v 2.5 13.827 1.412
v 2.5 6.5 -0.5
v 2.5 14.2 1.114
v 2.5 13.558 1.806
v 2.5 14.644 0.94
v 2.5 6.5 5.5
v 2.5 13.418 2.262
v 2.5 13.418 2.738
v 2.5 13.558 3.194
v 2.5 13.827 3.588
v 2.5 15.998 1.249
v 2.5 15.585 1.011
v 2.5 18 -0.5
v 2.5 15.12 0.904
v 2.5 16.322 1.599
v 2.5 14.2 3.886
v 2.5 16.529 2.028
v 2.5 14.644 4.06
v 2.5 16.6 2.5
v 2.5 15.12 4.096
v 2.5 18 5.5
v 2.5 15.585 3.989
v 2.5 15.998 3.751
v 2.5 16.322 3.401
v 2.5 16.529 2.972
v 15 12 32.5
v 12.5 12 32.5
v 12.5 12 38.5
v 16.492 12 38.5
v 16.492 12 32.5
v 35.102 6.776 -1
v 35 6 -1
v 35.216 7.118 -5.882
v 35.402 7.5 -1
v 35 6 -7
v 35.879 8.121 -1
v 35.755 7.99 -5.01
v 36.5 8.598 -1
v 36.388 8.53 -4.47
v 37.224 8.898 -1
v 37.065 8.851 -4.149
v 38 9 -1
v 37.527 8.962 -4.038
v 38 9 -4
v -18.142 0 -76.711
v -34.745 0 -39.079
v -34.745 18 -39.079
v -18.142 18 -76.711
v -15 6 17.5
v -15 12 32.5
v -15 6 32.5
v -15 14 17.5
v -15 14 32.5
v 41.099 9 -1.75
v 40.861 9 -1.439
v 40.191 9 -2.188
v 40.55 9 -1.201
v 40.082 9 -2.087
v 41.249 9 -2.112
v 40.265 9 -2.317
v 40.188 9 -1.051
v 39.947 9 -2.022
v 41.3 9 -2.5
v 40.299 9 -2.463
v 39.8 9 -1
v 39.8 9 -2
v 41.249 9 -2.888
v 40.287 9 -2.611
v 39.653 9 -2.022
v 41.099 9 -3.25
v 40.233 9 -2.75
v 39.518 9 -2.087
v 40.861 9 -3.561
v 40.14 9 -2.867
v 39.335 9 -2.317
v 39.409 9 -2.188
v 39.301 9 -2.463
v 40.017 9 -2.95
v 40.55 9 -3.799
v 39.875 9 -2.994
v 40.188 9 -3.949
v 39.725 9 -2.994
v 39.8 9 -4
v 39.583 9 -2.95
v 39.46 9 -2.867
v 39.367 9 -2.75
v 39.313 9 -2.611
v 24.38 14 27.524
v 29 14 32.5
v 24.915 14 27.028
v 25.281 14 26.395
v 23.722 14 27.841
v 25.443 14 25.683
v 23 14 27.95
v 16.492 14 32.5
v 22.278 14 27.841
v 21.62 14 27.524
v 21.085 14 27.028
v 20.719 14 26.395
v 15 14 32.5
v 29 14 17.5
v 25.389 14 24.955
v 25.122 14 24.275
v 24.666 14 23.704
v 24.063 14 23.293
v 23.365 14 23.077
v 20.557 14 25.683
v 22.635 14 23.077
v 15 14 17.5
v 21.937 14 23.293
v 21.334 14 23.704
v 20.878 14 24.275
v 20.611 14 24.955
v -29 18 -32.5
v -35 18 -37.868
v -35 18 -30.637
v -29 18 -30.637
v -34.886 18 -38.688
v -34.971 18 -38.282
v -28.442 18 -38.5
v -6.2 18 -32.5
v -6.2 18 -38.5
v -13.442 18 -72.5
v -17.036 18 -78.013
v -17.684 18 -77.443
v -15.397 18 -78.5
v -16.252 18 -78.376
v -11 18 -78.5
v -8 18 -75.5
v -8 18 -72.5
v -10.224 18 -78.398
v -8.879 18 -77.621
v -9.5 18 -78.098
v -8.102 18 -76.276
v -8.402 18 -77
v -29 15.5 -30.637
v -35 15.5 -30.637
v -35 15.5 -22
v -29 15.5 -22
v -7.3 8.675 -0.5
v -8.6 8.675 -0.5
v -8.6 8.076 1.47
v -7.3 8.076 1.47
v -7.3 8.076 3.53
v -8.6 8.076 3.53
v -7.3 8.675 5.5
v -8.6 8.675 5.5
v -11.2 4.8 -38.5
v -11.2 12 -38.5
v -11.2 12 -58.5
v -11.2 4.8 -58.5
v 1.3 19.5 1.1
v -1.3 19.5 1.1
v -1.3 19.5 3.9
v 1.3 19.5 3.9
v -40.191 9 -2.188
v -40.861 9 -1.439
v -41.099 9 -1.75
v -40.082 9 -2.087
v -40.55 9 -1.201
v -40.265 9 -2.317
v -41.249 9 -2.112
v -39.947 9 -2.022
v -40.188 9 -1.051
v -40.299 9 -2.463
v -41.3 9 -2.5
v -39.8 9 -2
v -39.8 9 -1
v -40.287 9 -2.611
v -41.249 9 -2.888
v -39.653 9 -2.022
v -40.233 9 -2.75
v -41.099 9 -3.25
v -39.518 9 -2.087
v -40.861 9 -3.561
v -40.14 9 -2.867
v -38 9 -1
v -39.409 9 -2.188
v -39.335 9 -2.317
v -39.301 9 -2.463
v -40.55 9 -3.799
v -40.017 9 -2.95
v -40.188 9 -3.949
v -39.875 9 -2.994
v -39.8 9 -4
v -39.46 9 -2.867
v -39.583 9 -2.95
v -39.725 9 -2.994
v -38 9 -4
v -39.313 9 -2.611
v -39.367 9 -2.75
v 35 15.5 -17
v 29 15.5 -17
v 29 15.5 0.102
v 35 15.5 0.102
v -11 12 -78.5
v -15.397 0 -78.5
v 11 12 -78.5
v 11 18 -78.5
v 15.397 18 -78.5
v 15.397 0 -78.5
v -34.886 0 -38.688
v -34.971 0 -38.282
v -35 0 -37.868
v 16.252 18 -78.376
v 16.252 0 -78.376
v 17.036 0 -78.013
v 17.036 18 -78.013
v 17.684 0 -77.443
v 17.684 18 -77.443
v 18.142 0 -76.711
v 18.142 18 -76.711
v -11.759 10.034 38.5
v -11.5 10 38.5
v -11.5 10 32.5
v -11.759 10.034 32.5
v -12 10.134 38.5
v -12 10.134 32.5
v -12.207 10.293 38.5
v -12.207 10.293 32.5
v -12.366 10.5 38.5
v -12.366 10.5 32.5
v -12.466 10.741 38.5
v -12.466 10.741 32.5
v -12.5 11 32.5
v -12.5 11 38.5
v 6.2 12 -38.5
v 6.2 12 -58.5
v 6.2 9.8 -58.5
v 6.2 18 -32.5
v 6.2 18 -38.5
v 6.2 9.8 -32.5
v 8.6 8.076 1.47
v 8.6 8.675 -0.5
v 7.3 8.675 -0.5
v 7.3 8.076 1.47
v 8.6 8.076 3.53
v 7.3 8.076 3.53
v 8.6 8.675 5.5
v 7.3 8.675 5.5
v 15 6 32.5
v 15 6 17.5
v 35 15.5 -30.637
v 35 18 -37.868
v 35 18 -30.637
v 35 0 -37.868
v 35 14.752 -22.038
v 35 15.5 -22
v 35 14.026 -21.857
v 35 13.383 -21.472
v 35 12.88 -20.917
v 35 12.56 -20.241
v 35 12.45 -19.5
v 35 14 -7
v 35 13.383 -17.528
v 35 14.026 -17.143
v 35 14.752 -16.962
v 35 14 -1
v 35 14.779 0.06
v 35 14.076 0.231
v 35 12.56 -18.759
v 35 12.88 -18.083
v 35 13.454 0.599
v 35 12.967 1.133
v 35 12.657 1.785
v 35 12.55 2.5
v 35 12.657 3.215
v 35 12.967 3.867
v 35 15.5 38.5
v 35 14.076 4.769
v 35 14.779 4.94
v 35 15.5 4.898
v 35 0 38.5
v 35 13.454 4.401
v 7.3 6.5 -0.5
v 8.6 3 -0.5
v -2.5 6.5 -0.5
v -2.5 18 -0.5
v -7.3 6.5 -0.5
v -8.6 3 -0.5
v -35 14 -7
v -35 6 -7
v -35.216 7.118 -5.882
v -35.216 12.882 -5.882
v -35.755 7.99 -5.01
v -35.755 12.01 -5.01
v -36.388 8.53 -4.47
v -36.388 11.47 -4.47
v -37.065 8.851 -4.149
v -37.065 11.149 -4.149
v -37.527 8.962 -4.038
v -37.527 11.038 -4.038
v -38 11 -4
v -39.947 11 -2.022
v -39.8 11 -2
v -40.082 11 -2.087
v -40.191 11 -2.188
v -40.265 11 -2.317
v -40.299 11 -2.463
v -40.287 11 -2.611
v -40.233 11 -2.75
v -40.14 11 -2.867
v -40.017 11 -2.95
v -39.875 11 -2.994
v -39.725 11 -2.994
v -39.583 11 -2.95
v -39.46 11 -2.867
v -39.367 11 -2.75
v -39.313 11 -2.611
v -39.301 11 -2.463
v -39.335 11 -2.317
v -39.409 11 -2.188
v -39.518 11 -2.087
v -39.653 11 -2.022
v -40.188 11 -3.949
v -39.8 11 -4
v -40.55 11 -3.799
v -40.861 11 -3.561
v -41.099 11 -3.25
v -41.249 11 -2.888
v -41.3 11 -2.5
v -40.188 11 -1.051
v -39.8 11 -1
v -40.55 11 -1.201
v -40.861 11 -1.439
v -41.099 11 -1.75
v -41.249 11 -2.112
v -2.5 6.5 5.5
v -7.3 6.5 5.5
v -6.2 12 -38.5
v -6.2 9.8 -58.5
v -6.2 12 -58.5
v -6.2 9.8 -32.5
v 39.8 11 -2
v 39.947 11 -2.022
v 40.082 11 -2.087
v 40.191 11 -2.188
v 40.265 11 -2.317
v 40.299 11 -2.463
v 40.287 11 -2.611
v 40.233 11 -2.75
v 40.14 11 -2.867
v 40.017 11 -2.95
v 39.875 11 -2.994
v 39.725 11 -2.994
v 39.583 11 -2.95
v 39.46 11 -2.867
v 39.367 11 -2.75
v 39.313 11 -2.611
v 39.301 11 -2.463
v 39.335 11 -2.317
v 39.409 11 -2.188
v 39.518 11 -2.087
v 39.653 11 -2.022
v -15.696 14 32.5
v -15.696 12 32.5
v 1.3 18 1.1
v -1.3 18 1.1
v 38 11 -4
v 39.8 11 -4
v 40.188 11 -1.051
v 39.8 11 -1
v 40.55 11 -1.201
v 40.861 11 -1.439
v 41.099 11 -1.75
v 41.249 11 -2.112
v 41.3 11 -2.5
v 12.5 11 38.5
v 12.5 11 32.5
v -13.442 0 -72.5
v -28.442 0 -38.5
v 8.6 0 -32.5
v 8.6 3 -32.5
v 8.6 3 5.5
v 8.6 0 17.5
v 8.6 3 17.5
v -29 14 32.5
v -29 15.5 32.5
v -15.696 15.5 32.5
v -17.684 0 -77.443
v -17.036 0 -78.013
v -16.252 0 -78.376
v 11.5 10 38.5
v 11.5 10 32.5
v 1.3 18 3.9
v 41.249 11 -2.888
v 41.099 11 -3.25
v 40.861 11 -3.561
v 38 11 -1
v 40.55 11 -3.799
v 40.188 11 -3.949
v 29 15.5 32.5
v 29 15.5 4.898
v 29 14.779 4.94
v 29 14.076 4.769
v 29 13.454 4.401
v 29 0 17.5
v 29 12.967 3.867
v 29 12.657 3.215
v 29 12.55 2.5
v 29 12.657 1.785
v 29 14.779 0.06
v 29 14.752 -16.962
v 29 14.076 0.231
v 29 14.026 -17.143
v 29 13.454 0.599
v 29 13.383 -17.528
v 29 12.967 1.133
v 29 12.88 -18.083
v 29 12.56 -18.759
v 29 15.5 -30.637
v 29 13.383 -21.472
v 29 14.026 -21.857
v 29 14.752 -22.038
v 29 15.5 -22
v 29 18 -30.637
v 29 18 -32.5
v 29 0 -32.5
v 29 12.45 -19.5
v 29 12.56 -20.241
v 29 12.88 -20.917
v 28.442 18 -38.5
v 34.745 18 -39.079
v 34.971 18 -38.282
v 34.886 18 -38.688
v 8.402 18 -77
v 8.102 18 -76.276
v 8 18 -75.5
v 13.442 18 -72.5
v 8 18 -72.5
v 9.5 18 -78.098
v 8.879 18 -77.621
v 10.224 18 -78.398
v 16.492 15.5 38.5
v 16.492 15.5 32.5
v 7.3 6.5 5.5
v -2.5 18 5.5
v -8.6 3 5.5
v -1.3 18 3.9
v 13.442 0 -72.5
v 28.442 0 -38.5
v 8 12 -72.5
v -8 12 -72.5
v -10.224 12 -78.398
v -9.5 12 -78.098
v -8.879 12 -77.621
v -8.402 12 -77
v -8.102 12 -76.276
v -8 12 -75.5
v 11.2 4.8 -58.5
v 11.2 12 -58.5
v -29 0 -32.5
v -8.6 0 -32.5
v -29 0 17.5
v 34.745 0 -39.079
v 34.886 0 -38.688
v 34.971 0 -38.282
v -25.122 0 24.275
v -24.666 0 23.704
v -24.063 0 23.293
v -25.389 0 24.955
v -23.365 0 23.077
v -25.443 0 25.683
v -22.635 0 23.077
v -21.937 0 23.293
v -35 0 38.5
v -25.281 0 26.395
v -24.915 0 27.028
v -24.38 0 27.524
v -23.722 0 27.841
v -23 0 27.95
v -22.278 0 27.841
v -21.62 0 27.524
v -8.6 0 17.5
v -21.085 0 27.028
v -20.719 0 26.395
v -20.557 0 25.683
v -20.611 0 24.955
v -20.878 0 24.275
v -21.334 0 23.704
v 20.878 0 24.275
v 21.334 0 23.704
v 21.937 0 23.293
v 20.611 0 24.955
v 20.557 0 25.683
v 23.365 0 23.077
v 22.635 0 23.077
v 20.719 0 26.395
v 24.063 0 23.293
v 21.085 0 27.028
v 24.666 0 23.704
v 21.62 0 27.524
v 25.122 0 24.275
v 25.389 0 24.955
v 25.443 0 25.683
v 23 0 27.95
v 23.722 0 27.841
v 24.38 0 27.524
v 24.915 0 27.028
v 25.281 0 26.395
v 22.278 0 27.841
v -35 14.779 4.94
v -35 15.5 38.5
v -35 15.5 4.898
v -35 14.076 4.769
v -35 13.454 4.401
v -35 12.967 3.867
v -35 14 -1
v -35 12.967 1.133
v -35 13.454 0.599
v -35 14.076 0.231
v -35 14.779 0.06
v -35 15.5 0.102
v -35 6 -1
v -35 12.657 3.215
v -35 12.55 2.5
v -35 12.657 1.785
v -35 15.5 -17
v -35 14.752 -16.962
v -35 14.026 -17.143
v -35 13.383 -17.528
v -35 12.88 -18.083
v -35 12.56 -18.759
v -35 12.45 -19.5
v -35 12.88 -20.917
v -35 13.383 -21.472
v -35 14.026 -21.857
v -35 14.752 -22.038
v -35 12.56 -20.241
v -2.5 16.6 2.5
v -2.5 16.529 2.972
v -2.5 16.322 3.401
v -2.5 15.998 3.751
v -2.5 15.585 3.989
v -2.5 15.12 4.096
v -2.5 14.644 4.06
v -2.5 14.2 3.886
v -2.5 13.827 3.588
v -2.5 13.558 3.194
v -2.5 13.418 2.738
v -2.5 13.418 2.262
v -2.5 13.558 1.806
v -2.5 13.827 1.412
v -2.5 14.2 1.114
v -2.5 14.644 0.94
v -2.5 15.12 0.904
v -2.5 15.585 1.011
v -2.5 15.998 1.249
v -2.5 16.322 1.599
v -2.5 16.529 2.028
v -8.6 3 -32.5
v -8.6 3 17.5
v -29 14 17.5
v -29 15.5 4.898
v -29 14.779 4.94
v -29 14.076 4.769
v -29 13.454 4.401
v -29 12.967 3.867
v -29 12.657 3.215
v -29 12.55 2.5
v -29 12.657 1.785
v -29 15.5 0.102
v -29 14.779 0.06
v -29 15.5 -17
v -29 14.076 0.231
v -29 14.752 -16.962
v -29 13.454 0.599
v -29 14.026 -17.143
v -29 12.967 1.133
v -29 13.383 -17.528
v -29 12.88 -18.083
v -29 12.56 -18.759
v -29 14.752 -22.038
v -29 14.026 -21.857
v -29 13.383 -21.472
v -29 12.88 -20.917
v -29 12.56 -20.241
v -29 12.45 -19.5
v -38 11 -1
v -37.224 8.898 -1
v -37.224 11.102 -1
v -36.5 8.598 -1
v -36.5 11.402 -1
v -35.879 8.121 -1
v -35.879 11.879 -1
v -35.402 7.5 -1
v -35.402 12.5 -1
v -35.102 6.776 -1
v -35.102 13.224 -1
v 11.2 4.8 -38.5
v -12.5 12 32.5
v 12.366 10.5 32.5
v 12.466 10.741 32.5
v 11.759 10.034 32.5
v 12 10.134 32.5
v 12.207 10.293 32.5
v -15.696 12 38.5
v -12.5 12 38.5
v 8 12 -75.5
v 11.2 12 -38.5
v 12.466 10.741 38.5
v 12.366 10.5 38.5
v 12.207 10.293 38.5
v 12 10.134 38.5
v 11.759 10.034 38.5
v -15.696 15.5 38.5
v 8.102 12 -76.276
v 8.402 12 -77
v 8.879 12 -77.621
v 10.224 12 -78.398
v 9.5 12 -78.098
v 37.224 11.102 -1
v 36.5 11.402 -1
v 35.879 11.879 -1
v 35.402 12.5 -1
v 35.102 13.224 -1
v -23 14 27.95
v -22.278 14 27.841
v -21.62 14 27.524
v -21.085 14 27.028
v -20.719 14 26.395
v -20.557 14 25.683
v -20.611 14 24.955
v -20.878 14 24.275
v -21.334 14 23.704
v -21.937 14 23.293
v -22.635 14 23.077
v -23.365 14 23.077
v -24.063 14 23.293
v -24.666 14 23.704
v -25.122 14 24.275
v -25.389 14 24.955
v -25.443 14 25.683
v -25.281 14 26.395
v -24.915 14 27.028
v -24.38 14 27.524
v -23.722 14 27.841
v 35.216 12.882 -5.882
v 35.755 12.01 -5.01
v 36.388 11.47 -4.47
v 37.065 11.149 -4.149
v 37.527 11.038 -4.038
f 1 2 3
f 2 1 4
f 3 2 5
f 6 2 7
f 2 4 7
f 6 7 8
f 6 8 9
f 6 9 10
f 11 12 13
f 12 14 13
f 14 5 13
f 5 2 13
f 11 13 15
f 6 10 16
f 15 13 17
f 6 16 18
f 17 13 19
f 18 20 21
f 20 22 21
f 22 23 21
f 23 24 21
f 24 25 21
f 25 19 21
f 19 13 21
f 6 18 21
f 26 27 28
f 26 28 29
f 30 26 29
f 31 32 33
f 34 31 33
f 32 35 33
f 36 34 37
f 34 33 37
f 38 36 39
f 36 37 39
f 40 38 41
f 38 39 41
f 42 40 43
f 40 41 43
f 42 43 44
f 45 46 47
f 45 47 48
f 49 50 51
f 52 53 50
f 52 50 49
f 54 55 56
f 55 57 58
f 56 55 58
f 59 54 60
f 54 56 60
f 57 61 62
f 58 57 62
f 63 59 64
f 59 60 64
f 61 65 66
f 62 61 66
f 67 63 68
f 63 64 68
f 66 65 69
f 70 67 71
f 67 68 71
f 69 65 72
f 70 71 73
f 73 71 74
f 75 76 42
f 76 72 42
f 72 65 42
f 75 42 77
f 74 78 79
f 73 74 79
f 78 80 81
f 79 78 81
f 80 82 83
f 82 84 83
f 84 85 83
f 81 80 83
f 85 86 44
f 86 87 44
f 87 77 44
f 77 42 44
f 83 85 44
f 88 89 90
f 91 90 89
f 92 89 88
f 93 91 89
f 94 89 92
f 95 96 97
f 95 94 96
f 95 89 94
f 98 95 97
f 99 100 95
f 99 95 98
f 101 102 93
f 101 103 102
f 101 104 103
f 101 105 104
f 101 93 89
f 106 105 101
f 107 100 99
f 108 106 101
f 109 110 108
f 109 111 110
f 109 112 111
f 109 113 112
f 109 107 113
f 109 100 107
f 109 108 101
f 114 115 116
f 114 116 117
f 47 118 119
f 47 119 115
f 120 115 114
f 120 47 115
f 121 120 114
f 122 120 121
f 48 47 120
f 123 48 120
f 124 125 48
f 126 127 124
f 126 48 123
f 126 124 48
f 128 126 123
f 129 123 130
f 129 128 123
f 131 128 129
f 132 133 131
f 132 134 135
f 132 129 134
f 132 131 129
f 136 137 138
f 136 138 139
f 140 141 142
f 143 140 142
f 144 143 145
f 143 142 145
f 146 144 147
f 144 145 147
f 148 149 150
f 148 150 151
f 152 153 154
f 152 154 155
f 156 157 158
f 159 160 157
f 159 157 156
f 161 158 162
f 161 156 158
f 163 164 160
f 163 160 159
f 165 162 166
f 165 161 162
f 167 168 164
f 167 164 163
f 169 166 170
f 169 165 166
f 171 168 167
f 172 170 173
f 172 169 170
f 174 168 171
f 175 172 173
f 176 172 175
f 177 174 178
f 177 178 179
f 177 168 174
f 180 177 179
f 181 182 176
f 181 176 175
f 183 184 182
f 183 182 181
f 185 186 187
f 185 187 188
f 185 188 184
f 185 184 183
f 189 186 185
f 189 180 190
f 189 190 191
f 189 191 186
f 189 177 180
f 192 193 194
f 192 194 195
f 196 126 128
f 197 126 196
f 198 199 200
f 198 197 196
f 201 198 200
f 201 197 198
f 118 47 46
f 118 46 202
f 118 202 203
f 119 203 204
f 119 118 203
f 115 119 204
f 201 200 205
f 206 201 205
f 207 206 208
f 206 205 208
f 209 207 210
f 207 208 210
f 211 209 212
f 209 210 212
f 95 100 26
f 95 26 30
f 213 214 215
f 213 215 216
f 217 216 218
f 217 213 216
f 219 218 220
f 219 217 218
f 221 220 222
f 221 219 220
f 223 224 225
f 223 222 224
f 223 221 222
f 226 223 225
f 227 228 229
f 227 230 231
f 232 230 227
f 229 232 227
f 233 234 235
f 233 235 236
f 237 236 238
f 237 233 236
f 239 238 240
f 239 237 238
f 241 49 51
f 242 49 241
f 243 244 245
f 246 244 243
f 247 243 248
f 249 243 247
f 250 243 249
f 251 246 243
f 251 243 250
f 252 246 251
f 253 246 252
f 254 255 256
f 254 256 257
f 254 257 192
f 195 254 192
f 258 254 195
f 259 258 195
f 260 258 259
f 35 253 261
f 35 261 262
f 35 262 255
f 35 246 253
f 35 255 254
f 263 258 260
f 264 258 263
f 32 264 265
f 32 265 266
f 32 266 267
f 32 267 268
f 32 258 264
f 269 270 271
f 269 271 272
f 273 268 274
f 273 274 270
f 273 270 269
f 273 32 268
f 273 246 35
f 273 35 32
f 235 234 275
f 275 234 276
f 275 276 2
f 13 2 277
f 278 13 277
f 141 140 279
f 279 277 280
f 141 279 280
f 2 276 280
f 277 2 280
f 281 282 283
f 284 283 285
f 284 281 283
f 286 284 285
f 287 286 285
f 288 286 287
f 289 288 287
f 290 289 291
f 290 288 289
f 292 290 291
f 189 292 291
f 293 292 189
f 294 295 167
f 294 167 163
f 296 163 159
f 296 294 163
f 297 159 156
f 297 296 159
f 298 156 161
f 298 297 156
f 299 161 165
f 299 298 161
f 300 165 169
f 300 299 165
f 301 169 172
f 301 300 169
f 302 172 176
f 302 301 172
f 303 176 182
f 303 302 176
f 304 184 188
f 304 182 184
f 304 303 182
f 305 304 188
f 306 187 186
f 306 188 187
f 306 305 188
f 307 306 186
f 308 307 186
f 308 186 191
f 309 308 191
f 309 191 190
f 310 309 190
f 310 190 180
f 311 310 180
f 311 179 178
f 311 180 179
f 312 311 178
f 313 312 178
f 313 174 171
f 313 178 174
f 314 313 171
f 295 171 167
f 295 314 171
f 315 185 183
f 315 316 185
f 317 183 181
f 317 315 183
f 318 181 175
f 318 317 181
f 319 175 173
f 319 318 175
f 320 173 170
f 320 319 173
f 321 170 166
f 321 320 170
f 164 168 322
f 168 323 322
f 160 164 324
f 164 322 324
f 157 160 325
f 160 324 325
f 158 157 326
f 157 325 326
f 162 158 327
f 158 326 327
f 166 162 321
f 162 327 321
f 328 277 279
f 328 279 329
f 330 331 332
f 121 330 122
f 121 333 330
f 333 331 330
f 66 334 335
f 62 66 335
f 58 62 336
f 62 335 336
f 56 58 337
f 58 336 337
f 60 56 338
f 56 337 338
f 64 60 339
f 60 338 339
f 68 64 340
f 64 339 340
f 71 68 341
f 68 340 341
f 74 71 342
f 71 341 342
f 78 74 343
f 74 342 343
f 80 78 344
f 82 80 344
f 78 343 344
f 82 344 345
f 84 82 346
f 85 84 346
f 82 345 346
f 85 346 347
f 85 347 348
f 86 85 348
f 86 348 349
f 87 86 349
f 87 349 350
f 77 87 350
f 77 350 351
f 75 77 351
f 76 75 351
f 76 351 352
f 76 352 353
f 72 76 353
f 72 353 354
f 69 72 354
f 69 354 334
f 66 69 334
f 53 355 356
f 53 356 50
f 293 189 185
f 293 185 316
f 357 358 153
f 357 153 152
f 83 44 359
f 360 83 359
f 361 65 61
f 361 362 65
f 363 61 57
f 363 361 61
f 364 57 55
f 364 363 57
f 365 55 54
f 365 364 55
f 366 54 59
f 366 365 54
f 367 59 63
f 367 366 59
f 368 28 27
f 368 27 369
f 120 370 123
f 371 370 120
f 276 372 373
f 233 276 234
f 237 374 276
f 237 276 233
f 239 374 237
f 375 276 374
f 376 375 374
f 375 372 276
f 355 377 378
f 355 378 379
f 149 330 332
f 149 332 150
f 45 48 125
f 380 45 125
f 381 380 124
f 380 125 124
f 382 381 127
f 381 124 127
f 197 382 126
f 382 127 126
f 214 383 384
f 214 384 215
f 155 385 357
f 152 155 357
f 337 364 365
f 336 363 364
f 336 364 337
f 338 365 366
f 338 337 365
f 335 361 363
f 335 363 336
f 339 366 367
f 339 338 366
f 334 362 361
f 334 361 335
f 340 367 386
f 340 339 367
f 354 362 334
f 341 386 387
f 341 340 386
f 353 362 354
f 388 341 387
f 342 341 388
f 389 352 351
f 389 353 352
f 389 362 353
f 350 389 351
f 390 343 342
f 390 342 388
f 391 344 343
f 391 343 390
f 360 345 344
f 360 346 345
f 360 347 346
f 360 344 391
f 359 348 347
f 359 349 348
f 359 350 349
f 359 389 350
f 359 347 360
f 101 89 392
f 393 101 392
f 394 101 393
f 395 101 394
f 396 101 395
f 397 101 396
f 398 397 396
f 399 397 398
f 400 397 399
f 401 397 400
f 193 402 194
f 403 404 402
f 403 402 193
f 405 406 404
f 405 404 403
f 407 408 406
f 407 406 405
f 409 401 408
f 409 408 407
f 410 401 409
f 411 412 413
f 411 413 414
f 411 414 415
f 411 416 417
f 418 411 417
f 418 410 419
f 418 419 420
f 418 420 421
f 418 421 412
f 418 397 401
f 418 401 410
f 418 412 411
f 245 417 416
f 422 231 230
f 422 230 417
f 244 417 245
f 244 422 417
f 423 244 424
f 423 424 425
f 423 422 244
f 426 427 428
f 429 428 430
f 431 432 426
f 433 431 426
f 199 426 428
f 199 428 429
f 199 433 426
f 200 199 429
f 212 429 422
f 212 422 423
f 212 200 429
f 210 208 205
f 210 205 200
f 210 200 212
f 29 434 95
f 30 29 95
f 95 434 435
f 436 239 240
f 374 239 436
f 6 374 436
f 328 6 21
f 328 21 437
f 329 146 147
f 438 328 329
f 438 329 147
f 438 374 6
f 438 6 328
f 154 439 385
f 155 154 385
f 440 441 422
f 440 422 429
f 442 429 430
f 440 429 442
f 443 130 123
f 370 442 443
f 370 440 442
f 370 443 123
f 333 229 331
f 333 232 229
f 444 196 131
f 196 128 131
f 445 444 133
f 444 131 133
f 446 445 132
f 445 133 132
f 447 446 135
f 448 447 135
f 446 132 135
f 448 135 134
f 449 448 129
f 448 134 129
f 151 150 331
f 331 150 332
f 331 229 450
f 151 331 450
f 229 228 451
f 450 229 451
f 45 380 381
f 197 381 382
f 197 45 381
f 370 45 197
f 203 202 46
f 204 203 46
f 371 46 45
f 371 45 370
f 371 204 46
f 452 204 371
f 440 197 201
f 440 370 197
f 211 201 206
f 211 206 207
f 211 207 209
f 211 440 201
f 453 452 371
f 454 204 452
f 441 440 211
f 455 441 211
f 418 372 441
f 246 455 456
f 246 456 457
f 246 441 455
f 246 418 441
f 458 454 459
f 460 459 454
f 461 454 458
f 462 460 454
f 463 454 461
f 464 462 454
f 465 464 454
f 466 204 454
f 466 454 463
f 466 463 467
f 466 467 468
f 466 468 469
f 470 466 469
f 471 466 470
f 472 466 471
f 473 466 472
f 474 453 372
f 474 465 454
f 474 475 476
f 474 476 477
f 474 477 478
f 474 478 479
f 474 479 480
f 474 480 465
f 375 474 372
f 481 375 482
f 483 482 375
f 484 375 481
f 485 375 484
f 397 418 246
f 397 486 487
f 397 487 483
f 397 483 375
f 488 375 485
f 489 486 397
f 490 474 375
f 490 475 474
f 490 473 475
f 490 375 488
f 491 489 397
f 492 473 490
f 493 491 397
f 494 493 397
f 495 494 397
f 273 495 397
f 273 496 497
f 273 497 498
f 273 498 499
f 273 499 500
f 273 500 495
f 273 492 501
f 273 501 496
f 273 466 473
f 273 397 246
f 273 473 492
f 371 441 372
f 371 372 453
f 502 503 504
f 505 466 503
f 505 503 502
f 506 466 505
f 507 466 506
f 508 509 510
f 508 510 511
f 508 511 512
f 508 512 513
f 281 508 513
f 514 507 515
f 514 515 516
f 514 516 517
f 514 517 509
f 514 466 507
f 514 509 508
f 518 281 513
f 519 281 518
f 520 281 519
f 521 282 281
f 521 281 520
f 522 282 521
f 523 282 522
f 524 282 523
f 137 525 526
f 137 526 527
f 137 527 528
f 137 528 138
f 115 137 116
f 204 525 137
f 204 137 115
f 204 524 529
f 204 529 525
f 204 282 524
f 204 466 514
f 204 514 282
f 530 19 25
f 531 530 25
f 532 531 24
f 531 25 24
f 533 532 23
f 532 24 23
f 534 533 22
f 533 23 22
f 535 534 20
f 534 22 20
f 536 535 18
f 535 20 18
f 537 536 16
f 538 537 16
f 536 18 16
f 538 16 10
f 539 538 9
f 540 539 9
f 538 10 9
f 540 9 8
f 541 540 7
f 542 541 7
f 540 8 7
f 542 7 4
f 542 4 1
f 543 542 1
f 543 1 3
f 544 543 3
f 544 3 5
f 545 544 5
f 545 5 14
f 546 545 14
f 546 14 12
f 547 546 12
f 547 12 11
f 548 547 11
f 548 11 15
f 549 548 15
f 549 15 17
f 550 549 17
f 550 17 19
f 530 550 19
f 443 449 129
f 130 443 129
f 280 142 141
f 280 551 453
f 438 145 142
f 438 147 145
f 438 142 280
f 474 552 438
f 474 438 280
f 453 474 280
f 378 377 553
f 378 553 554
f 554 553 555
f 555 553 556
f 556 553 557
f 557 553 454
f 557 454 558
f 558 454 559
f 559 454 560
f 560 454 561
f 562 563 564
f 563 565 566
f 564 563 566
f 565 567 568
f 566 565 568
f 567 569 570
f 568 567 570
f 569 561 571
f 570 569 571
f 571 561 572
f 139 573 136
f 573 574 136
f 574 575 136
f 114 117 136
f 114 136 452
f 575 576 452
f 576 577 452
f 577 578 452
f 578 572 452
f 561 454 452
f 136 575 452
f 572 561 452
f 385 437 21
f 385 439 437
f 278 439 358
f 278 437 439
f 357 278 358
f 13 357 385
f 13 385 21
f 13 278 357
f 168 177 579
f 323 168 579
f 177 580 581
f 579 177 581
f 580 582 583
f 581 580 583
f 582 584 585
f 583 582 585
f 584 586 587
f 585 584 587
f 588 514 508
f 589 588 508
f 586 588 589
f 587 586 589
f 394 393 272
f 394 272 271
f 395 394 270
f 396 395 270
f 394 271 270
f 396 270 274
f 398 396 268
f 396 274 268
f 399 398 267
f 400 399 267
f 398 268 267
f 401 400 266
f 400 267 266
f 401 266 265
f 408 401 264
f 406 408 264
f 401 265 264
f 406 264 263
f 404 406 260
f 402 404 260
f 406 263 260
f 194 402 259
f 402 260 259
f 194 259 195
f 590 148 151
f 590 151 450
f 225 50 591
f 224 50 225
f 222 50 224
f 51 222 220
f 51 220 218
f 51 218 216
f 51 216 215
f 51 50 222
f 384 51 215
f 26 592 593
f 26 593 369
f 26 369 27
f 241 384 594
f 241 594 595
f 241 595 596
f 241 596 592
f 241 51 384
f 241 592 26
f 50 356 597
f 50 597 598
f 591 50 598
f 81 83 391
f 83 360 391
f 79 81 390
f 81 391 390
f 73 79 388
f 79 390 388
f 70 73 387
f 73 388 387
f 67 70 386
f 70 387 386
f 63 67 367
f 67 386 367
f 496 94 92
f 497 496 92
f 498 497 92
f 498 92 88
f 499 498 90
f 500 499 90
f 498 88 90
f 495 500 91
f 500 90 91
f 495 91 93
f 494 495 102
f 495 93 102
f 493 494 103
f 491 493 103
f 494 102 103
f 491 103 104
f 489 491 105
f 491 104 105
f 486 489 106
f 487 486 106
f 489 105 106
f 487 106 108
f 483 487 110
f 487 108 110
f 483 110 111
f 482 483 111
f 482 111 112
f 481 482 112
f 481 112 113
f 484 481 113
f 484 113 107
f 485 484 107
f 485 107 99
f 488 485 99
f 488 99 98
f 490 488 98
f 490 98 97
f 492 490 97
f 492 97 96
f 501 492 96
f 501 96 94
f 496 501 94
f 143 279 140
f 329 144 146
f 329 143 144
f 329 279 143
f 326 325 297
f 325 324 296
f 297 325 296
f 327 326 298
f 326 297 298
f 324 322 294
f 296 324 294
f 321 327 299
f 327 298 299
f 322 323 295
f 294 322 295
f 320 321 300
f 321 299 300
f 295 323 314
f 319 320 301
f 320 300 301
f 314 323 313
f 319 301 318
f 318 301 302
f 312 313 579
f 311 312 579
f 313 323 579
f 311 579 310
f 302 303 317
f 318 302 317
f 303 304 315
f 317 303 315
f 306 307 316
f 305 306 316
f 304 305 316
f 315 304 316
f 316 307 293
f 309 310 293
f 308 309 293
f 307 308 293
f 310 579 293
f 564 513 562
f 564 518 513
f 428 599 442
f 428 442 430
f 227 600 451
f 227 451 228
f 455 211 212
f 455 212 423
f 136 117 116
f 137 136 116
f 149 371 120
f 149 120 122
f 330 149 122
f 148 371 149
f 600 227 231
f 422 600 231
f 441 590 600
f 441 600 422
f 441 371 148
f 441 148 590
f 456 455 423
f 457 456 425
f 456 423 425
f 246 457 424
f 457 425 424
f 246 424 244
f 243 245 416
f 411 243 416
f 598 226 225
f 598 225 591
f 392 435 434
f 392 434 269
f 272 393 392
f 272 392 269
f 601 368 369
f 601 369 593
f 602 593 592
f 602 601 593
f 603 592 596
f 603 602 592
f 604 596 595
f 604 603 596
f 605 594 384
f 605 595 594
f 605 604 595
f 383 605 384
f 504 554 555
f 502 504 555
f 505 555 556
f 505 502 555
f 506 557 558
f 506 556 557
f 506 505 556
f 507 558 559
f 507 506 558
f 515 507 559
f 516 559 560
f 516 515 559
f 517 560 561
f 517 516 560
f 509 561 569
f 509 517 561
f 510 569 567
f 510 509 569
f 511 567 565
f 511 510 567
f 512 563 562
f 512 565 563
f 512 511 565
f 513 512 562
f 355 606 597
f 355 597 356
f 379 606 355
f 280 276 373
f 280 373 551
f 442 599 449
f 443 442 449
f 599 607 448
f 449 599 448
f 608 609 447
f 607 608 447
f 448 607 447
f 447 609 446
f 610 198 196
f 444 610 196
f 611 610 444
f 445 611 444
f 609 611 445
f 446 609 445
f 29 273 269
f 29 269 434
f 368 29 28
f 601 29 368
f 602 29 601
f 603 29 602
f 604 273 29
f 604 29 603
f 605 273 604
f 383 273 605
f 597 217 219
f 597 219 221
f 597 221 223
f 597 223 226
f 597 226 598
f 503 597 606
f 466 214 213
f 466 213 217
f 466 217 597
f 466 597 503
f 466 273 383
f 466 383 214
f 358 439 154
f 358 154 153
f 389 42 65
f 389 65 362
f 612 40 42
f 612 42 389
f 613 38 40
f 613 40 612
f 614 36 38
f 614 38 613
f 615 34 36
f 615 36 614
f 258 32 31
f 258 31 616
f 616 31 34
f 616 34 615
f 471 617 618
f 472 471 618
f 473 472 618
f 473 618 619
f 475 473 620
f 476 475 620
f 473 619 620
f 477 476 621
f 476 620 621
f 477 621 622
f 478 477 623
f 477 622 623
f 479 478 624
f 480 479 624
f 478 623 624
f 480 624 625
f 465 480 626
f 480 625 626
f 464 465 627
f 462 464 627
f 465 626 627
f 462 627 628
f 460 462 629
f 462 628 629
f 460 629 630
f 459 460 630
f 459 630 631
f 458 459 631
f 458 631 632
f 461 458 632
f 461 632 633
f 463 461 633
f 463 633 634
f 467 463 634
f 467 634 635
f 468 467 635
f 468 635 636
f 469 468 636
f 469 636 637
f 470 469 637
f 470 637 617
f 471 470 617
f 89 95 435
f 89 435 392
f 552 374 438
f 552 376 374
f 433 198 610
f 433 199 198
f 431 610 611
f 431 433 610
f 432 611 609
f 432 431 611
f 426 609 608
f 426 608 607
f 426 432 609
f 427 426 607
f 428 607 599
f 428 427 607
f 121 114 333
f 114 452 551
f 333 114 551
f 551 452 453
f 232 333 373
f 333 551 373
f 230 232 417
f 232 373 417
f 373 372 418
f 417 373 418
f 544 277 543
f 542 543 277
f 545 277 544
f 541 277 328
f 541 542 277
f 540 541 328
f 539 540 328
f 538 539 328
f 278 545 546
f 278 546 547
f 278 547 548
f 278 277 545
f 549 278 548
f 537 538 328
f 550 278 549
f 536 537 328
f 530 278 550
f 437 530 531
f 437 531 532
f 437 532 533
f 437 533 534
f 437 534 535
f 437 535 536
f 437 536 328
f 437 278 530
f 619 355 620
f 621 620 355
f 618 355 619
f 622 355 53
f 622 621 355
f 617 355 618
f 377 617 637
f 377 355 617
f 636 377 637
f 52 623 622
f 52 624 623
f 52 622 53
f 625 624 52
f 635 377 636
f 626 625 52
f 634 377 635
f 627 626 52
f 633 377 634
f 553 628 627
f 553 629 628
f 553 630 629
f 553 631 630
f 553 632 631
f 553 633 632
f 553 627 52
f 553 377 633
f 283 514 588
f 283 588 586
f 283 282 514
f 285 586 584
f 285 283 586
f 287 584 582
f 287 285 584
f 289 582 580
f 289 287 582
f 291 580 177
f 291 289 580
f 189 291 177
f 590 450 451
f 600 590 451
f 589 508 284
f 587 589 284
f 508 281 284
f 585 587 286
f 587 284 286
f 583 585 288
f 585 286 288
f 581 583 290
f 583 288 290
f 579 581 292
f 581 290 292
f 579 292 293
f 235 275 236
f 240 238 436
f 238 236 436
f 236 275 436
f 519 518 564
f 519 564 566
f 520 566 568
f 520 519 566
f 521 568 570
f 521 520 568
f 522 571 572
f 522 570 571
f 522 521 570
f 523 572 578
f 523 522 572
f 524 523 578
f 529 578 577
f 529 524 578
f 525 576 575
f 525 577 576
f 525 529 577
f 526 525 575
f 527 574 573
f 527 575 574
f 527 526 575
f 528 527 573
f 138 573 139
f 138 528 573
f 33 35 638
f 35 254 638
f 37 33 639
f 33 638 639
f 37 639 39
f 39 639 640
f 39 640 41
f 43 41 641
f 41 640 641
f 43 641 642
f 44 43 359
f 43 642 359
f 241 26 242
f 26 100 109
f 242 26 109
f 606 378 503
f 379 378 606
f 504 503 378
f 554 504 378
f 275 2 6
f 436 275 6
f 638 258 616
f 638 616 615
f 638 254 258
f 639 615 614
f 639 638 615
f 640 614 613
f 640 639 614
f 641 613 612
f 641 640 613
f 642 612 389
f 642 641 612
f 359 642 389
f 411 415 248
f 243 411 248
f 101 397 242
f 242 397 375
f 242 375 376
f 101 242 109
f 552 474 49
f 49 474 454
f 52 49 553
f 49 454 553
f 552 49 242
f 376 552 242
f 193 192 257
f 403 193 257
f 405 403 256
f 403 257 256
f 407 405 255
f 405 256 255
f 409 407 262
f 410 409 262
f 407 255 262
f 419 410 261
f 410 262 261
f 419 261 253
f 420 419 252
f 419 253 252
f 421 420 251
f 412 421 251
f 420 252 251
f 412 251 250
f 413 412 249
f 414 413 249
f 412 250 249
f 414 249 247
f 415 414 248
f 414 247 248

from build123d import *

# Parameters (mm, degrees)
SKETCH1_W               = 58
SKETCH1_H               = 65
BOSS_EXTRUDE1_DEPTH     = 30
BOSS_EXTRUDE3_REACH     = 92.09
SKETCH10_W              = 5
SKETCH10_H              = 6
CUT_EXTRUDE1_REACH      = 111.372
SKETCH2_R               = 2.45
SKETCH2_R_2             = 2.55
CUT_EXTRUDE2_REACH      = 91.744
SKETCH3_W               = 12.4
SKETCH3_H               = 10.4
SKETCH11_W              = 3
SKETCH11_H              = 2
BOSS_EXTRUDE4_DEPTH     = 6.3
FILLET3_R               = 1.5
SKETCH12_R              = 0.5
CUT_EXTRUDE3_DEPTH      = 92.15338732
FILLET3_OF_MIRROR1_R    = 1.5
BOSS_EXTRUDE5_REACH     = 111.564
SKETCH13_W              = 15
SKETCH13_H              = 6
BOSS_EXTRUDE6_REACH     = 111.564
SKETCH17_W              = 15
SKETCH17_H              = 14
SKETCH14_R              = 2.45
CUT_EXTRUDE4_DEPTH      = 94.637279017
SKETCH16_W              = 16
SKETCH16_H              = 7
CUT_EXTRUDE7_DEPTH      = 15
CUT_EXTRUDE8_REACH      = 129.651
CUT_EXTRUDE9_START      = -6
SKETCH19_W              = 30
SKETCH19_H              = 15
CUT_EXTRUDE9_DEPTH      = 18
CUT_EXTRUDE18_REACH     = 129.651
SKETCH35_W              = 16
SKETCH35_H              = 6
FILLET5_R               = 3
BOSS_EXTRUDE7_START     = 20.2
BOSS_EXTRUDE7_DEPTH     = 9.8
CUT_EXTRUDE12_REACH     = 109.009
CUT_EXTRUDE12_START     = 16.5
SKETCH23_W              = 12.3
SKETCH23_H              = 6
BOSS_EXTRUDE8_DEPTH     = 20
CUT_EXTRUDE15_REACH     = 95.168
SKETCH28_R              = 0.8
FILLET4_R               = 3
CUT_EXTRUDE16_REACH     = 96.767
SKETCH29_R              = 1.6
SKETCH30_W              = 6
SKETCH30_H              = 3.5
BOSS_EXTRUDE9_DEPTH     = 6.1
SKETCH31_W              = 1.3
SKETCH31_H              = 6
BOSS_EXTRUDE10_DEPTH    = 5
CUT_EXTRUDE17_REACH     = 99.736
MIRROR5_COPY_1_SKETCH_W = 6
MIRROR5_COPY_1_SKETCH_H = 3.5
MIRROR5_COPY_1_DEPTH    = 6.1
MIRROR5_COPY_2_SKETCH_W = 1.3
MIRROR5_COPY_2_SKETCH_H = 6
MIRROR5_COPY_2_DEPTH    = 5
MIRROR5_COPY_3_REACH    = 99.736
SKETCH36_W              = 164.658600107
SKETCH36_H              = 149.862089959
CUT_EXTRUDE19_DEPTH     = 12
SKETCH37_W              = 5
SKETCH37_H              = 6
CUT_EXTRUDE20_DEPTH     = 2.5
SKETCH38_W              = 32.18776844
SKETCH38_H              = 6
CUT_EXTRUDE21_DEPTH     = 3.5
SKETCH39_W              = 2.6
SKETCH39_H              = 2.8
BOSS_EXTRUDE11_DEPTH    = 1.5


with BuildPart() as part:
    # Sketch1 → Boss-Extrude1 (new body)
    with BuildSketch(Plane(origin=(0, 0, 0), x_dir=(1, 0, 0), z_dir=(0, 1, 0))):
        Polygon((-35, 38.5), (-17.352941176, 78.5), (17.352941947, 78.5), (35, 38.5), (35, -38.5), (-35, -38.5), align=None)
        Rectangle(SKETCH1_W, SKETCH1_H, mode=Mode.SUBTRACT)
        Polygon((-28.44203382, 38.5), (28.442033867, 38.5), (13.442034522, 72.5), (-13.44203382, 72.5), align=None, mode=Mode.SUBTRACT)
    extrude(amount=BOSS_EXTRUDE1_DEPTH)

    # Sketch7 → Loft3 section 0
    with BuildSketch(Plane.XY.offset(-32.5)):
        with BuildLine():
            Line((-8.6, 30), (8.6, 30))
            Line((8.6, 30), (8.6, 27))
            Line((8.6, 27), (-8.6, 27))
            Line((-8.6, 27), (-8.6, 30))
        make_face()
    # Sketch8 → Loft3 section 1
    with BuildSketch(Plane.XY.offset(5.5)):
        with BuildLine():
            Line((-8.6, 30), (8.6, 30))
            Line((8.6, 30), (8.6, 27))
            Line((8.6, 27), (-8.6, 27))
            Line((-8.6, 27), (-8.6, 30))
        make_face()
    loft3 = loft()

    # Mirror3: Loft3 across plane
    add(loft3.mirror(Plane(origin=(0, 15, 0), x_dir=(0, 0, 1), z_dir=(0, -1, 0))))

    # Sketch10 → Boss-Extrude3 (add, up to next)
    with BuildSketch(Plane.XZ.offset(-27), mode=Mode.PRIVATE) as boss_extrude3_sk1:
        with Locations((0, 2.5)):
            Rectangle(SKETCH10_W, SKETCH10_H)
    boss_extrude3_tool1 = extrude(boss_extrude3_sk1.sketch, amount=BOSS_EXTRUDE3_REACH, mode=Mode.PRIVATE) - part.part
    add(boss_extrude3_tool1.solids().sort_by_distance((0, 27, 2.5))[0])

    # Sketch2 → Cut-Extrude1 (cut, up to next)
    with BuildSketch(Plane(origin=(35, 0, 0), x_dir=(0, 0, -1), z_dir=(1, 0, 0)), mode=Mode.PRIVATE) as cut_extrude1_sk1:
        with Locations((-2.5, 15)):
            Circle(SKETCH2_R)
    cut_extrude1_tool1 = extrude(cut_extrude1_sk1.sketch, amount=-CUT_EXTRUDE1_REACH, mode=Mode.PRIVATE) & part.part
    # Sketch2 → Cut-Extrude1 (cut, up to next)
    with BuildSketch(Plane(origin=(35, 0, 0), x_dir=(0, 0, -1), z_dir=(1, 0, 0)), mode=Mode.PRIVATE) as cut_extrude1_sk2:
        with Locations((19.5, 15)):
            Circle(SKETCH2_R_2)
    cut_extrude1_tool2 = extrude(cut_extrude1_sk2.sketch, amount=-CUT_EXTRUDE1_REACH, mode=Mode.PRIVATE) & part.part
    cut_extrude1_1 = cut_extrude1_tool1.solids().sort_by_distance((35, 15, 2.5))[0]
    add(cut_extrude1_1, mode=Mode.SUBTRACT)
    cut_extrude1_2 = cut_extrude1_tool2.solids().sort_by_distance((35, 15, -19.5))[0]
    add(cut_extrude1_2, mode=Mode.SUBTRACT)
    cut_extrude1 = cut_extrude1_1 + cut_extrude1_2  # Cut-Extrude1 as one shape, for the pattern or mirror that repeats it

    # Sketch3 → Cut-Extrude2 (cut, up to next)
    with BuildSketch(Plane(origin=(0, 0, -38.5), x_dir=(-1, 0, 0), z_dir=(0, 0, -1)), mode=Mode.PRIVATE) as cut_extrude2_sk1:
        with Locations((0, 15)):
            Rectangle(SKETCH3_W, SKETCH3_H)
    cut_extrude2_tool1 = extrude(cut_extrude2_sk1.sketch, amount=-CUT_EXTRUDE2_REACH, mode=Mode.PRIVATE) & part.part
    add(cut_extrude2_tool1.solids().sort_by_distance((0, 15, -38.5))[0], mode=Mode.SUBTRACT)

    # Sketch11 → Boss-Extrude4 (add)
    with BuildSketch(Plane(origin=(35, 0, 0), x_dir=(0, 0, -1), z_dir=(1, 0, 0))):
        with Locations((2.5, 20)):
            Rectangle(SKETCH11_W, SKETCH11_H)
        with Locations((2.5, 10)):
            Rectangle(SKETCH11_W, SKETCH11_H)
    boss_extrude4 = extrude(amount=BOSS_EXTRUDE4_DEPTH)

    # Fillet3
    fillet3_edges = [part.edges().sort_by_distance(p)[0] for p in [
        (41.3, 10, -1),
        (41.3, 10, -4),
        (41.3, 20, -1),
        (41.3, 20, -4),
    ]]
    fillet(fillet3_edges, radius=FILLET3_R - 0.0001)  # a hair under: the kernel refuses the full size

    # Sketch12 → Cut-Extrude3 (cut, through all)
    with BuildSketch(Plane(origin=(0, 21, 0), x_dir=(1, 0, 0), z_dir=(0, 1, 0))):
        with Locations(Location((39.8, 2.5, 0), (0, 0, 270))):
            Circle(SKETCH12_R)
    cut_extrude3 = extrude(amount=-CUT_EXTRUDE3_DEPTH, mode=Mode.SUBTRACT)

    # Mirror1: Cut-Extrude1, Boss-Extrude4, Cut-Extrude3 across plane
    add(cut_extrude1.mirror(Plane(origin=(0, 0, 0), x_dir=(0, 0, 1), z_dir=(1, 0, 0))), mode=Mode.SUBTRACT)
    add(boss_extrude4.mirror(Plane(origin=(0, 0, 0), x_dir=(0, 0, 1), z_dir=(1, 0, 0))))
    add(cut_extrude3.mirror(Plane(origin=(0, 0, 0), x_dir=(0, 0, 1), z_dir=(1, 0, 0))), mode=Mode.SUBTRACT)

    # Fillet3 of Mirror1
    fillet3_of_mirror1_edges = [part.edges().sort_by_distance(p)[0] for p in [
        (-41.3, 10, -1),
        (-41.3, 10, -4),
        (-41.3, 20, -1),
        (-41.3, 20, -4),
    ]]
    fillet(fillet3_of_mirror1_edges, radius=FILLET3_OF_MIRROR1_R - 0.0001)  # a hair under: the kernel refuses the full size

    # Sketch13 → Boss-Extrude5 (add, up to next)
    with BuildSketch(Plane(origin=(-29, 0, 0), x_dir=(0, 0, -1), z_dir=(1, 0, 0)), mode=Mode.PRIVATE) as boss_extrude5_sk1:
        with Locations((-25, 27)):
            Rectangle(SKETCH13_W, SKETCH13_H)
    boss_extrude5_tool1 = extrude(boss_extrude5_sk1.sketch, amount=BOSS_EXTRUDE5_REACH, mode=Mode.PRIVATE) - part.part
    add(boss_extrude5_tool1.solids().sort_by_distance((-29, 27, 25))[0])

    # Sketch17 → Boss-Extrude6 (add, up to next)
    with BuildSketch(Plane(origin=(-29, 0, 0), x_dir=(0, 0, -1), z_dir=(1, 0, 0)), mode=Mode.PRIVATE) as boss_extrude6_sk1:
        with Locations((-25, 7)):
            Rectangle(SKETCH17_W, SKETCH17_H)
    boss_extrude6_tool1 = extrude(boss_extrude6_sk1.sketch, amount=BOSS_EXTRUDE6_REACH, mode=Mode.PRIVATE) - part.part
    add(boss_extrude6_tool1.solids().sort_by_distance((-29, 7, 25))[0])

    # Sketch14 → Cut-Extrude4 (cut, through all)
    with BuildSketch(Plane(origin=(0, 30, 0), x_dir=(1, 0, 0), z_dir=(0, 1, 0))):
        with Locations(Location((-23, -25.5, 0), (0, 0, 270))):
            Circle(SKETCH14_R)
        with Locations(Location((23, -25.5, 0), (0, 0, 270))):
            Circle(SKETCH14_R)
    extrude(amount=-CUT_EXTRUDE4_DEPTH, mode=Mode.SUBTRACT)

    # Sketch16 → Cut-Extrude7 (cut)
    with BuildSketch(Plane(origin=(35, 0, 0), x_dir=(0, 0, -1), z_dir=(1, 0, 0))):
        with Locations((-30.5, 19)):
            Rectangle(SKETCH16_W, SKETCH16_H)
    cut_extrude7 = extrude(amount=-CUT_EXTRUDE7_DEPTH, mode=Mode.SUBTRACT)

    # Mirror2: Cut-Extrude7 across plane
    add(cut_extrude7.mirror(Plane(origin=(0, 0, 0), x_dir=(0, 0, 1), z_dir=(1, 0, 0))), mode=Mode.SUBTRACT)

    # Sketch18 → Cut-Extrude8 (cut, up to next)
    with BuildSketch(Plane.XY.offset(38.5), mode=Mode.PRIVATE) as cut_extrude8_sk1:
        with BuildLine():
            Line((-11.5, 14), (11.5, 14))
            ThreePointArc((11.5, 14), (12.207106781, 13.707106781), (12.5, 13))
            Line((12.5, 13), (12.5, 11))
            ThreePointArc((12.5, 11), (12.207106781, 10.292893219), (11.5, 10))
            Line((11.5, 10), (-11.5, 10))
            ThreePointArc((-11.5, 10), (-12.207106781, 10.292893219), (-12.5, 11))
            Line((-12.5, 11), (-12.5, 13))
            ThreePointArc((-12.5, 13), (-12.207106781, 13.707106781), (-11.5, 14))
        make_face()
    cut_extrude8_tool1 = extrude(cut_extrude8_sk1.sketch, amount=-CUT_EXTRUDE8_REACH, mode=Mode.PRIVATE) & part.part
    add(cut_extrude8_tool1.solids().sort_by_distance((0, 12, 38.5))[0], mode=Mode.SUBTRACT)

    # Sketch19 → Cut-Extrude9 (cut)
    with BuildSketch(Plane(origin=(0, 30, 0), x_dir=(1, 0, 0), z_dir=(0, 1, 0)).offset(CUT_EXTRUDE9_START)):
        with Locations((0, -25)):
            Rectangle(SKETCH19_W, SKETCH19_H)
    extrude(amount=-CUT_EXTRUDE9_DEPTH, mode=Mode.SUBTRACT)

    # Sketch35 → Cut-Extrude18 (cut, up to next)
    with BuildSketch(Plane(origin=(0, 0, -78.5), x_dir=(-1, 0, 0), z_dir=(0, 0, -1)), mode=Mode.PRIVATE) as cut_extrude18_sk1:
        with Locations((0, 15)):
            Rectangle(SKETCH35_W, SKETCH35_H)
    cut_extrude18_tool1 = extrude(cut_extrude18_sk1.sketch, amount=-CUT_EXTRUDE18_REACH, mode=Mode.PRIVATE) & part.part
    add(cut_extrude18_tool1.solids().sort_by_distance((0, 15, -78.5))[0], mode=Mode.SUBTRACT)

    # Fillet5
    fillet5_edges = [part.edges().sort_by_distance(p)[0] for p in [
        (-35, 15, -38.5),
        (-17.352941176, 15, -78.5),
        (17.352941947, 15, -78.5),
        (35, 15, -38.5),
        (-8, 15, -78.5),
        (8, 15, -78.5),
    ]]
    fillet(fillet5_edges, radius=FILLET5_R)

    # Sketch24 → Boss-Extrude7 (add)
    with BuildSketch(Plane(origin=(0, 0, 0), x_dir=(1, 0, 0), z_dir=(0, 1, 0)).offset(BOSS_EXTRUDE7_START)):
        Polygon((9.15, 52.5), (9.15, 72.5), (6.15, 72.5), (6.15, 49.5), (-6.15, 49.5), (-6.15, 72.5), (-9.15, 72.5), (-9.15, 49.5), (-23.589092644, 49.5), (-26.23615161, 43.5), (26.23615161, 43.5), (22.346632225, 52.316244325), align=None)
    extrude(amount=BOSS_EXTRUDE7_DEPTH)

    # Sketch23 → Cut-Extrude12 (cut, up to next)
    with BuildSketch(Plane(origin=(0, 12, 0), x_dir=(1, 0, 0), z_dir=(0, 1, 0)).offset(CUT_EXTRUDE12_START), mode=Mode.PRIVATE) as cut_extrude12_sk1:
        with Locations((0, 75.5)):
            Rectangle(SKETCH23_W, SKETCH23_H)
    cut_extrude12_tool1 = extrude(cut_extrude12_sk1.sketch, amount=CUT_EXTRUDE12_REACH, mode=Mode.PRIVATE) & part.part
    # Sketch23 → Cut-Extrude12 (cut, up to next)
    with BuildSketch(Plane(origin=(0, 12, 0), x_dir=(1, 0, 0), z_dir=(0, 1, 0)).offset(CUT_EXTRUDE12_START), mode=Mode.PRIVATE) as cut_extrude12_sk2:
        with Locations((0, 46.5)):
            Rectangle(SKETCH23_W, SKETCH23_H)
    cut_extrude12_tool2 = extrude(cut_extrude12_sk2.sketch, amount=CUT_EXTRUDE12_REACH, mode=Mode.PRIVATE) & part.part
    add(cut_extrude12_tool1.solids().sort_by_distance((0, 28.5, -75.5))[0], mode=Mode.SUBTRACT)
    add(cut_extrude12_tool2.solids().sort_by_distance((0, 28.5, -46.5))[0], mode=Mode.SUBTRACT)

    # Sketch26 → Boss-Extrude8 (add)
    with BuildSketch(Plane(origin=(0, 0, -38.5), x_dir=(-1, 0, 0), z_dir=(0, 0, -1))):
        Polygon((-6.2, 9.8), (6.2, 9.8), (6.2, 12), (11.2, 12), (11.2, 4.8), (-11.2, 4.8), (-11.2, 12), (-6.2, 12), align=None)
    extrude(amount=BOSS_EXTRUDE8_DEPTH)

    # Sketch28 → Cut-Extrude15 (cut, up to next)
    with BuildSketch(Plane(origin=(0, 28.5, 0), x_dir=(-1, 0, 0), z_dir=(0, 1, 0)), mode=Mode.PRIVATE) as cut_extrude15_sk1:
        with Locations(Location((0, -46.5, 0), (0, 0, 90))):
            Circle(SKETCH28_R)
    cut_extrude15_tool1 = extrude(cut_extrude15_sk1.sketch, amount=-CUT_EXTRUDE15_REACH, mode=Mode.PRIVATE) & part.part
    # Sketch28 → Cut-Extrude15 (cut, up to next)
    with BuildSketch(Plane(origin=(0, 28.5, 0), x_dir=(-1, 0, 0), z_dir=(0, 1, 0)), mode=Mode.PRIVATE) as cut_extrude15_sk2:
        with Locations(Location((0, -75.5, 0), (0, 0, 90))):
            Circle(SKETCH28_R)
    cut_extrude15_tool2 = extrude(cut_extrude15_sk2.sketch, amount=-CUT_EXTRUDE15_REACH, mode=Mode.PRIVATE) & part.part
    add(cut_extrude15_tool1.solids().sort_by_distance((0, 28.5, -46.5))[0], mode=Mode.SUBTRACT)
    add(cut_extrude15_tool2.solids().sort_by_distance((0, 28.5, -75.5))[0], mode=Mode.SUBTRACT)

    # Fillet4
    fillet4_edges = [part.edges().sort_by_distance(p)[0] for p in [
        (35, 19, -2.5),
        (35, 20, -4),
        (35, 21, -2.5),
        (35, 11, -2.5),
        (35, 9, -2.5),
        (35, 10, -4),
        (-35, 19, -2.5),
        (-35, 20, -4),
        (-35, 21, -2.5),
        (-35, 11, -2.5),
        (-35, 9, -2.5),
        (-35, 10, -4),
    ]]
    fillet(fillet4_edges, radius=FILLET4_R)

    # Sketch29 → Cut-Extrude16 (cut, up to next)
    with BuildSketch(Plane(origin=(2.5, 0, 0), x_dir=(0, 0, -1), z_dir=(1, 0, 0)), mode=Mode.PRIVATE) as cut_extrude16_sk1:
        with Locations(Location((-2.5, 15, 0), (0, 0, 90))):
            Circle(SKETCH29_R)
    cut_extrude16_tool1 = extrude(cut_extrude16_sk1.sketch, amount=-CUT_EXTRUDE16_REACH, mode=Mode.PRIVATE) & part.part
    add(cut_extrude16_tool1.solids().sort_by_distance((2.5, 15, 2.5))[0], mode=Mode.SUBTRACT)

    # Sketch30 → Boss-Extrude9 (add)
    with BuildSketch(Plane.ZY.offset(2.5)):
        with Locations((2.5, 25.25)):
            Rectangle(SKETCH30_W, SKETCH30_H)
    boss_extrude9 = extrude(amount=BOSS_EXTRUDE9_DEPTH)

    # Sketch31 → Boss-Extrude10 (add)
    with BuildSketch(Plane.XZ.offset(-23.5)):
        with Locations((-7.95, 2.5)):
            Rectangle(SKETCH31_W, SKETCH31_H)
    boss_extrude10 = extrude(amount=BOSS_EXTRUDE10_DEPTH)

    # Sketch32 → Cut-Extrude17 (cut, up to next)
    with BuildSketch(Plane.ZY.offset(8.6), mode=Mode.PRIVATE) as cut_extrude17_sk1:
        with BuildLine():
            Line((-0.5, 18.5), (-0.5, 21.32455532))
            ThreePointArc((-0.5, 21.32455532), (2.5, 22), (5.5, 21.32455532))
            Line((5.5, 21.32455532), (5.5, 18.5))
            Line((5.5, 18.5), (-0.5, 18.5))
        make_face()
    cut_extrude17_tool1 = extrude(cut_extrude17_sk1.sketch, amount=-CUT_EXTRUDE17_REACH, mode=Mode.PRIVATE) & part.part
    cut_extrude17 = cut_extrude17_tool1.solids().sort_by_distance((-8.6, 20.145783, 2.5))[0]
    add(cut_extrude17, mode=Mode.SUBTRACT)

    # Mirror4: Boss-Extrude9, Boss-Extrude10, Cut-Extrude17 across plane
    add(boss_extrude9.mirror(Plane(origin=(0, 15, 0), x_dir=(0, 0, 1), z_dir=(0, -1, 0))))
    add(boss_extrude10.mirror(Plane(origin=(0, 15, 0), x_dir=(0, 0, 1), z_dir=(0, -1, 0))))
    add(cut_extrude17.mirror(Plane(origin=(0, 15, 0), x_dir=(0, 0, 1), z_dir=(0, -1, 0))), mode=Mode.SUBTRACT)

    # Mirror5: Boss-Extrude9, Boss-Extrude10, Cut-Extrude17 across plane
    add(boss_extrude9.mirror(Plane(origin=(0, 0, 0), x_dir=(0, 0, 1), z_dir=(1, 0, 0))))
    add(boss_extrude10.mirror(Plane(origin=(0, 0, 0), x_dir=(0, 0, 1), z_dir=(1, 0, 0))))
    add(cut_extrude17.mirror(Plane(origin=(0, 0, 0), x_dir=(0, 0, 1), z_dir=(1, 0, 0))), mode=Mode.SUBTRACT)

    # Mirror5 copy 1 sketch → Mirror5 copy 1 (add)
    with BuildSketch(Plane(origin=(2.5, 30, 0), x_dir=(0, 0, 1), z_dir=(1, 0, 0))):
        with Locations((2.5, 25.25)):
            Rectangle(MIRROR5_COPY_1_SKETCH_W, MIRROR5_COPY_1_SKETCH_H)
    extrude(amount=MIRROR5_COPY_1_DEPTH)

    # Mirror5 copy 2 sketch → Mirror5 copy 2 (add)
    with BuildSketch(Plane(origin=(0, 6.5, 0), x_dir=(-1, 0, 0), z_dir=(0, 1, 0))):
        with Locations((-7.95, 2.5)):
            Rectangle(MIRROR5_COPY_2_SKETCH_W, MIRROR5_COPY_2_SKETCH_H)
    extrude(amount=MIRROR5_COPY_2_DEPTH)

    # Mirror5 copy 3 sketch → Mirror5 copy 3 (cut, up to next)
    with BuildSketch(Plane(origin=(8.6, 30, 0), x_dir=(0, 0, 1), z_dir=(1, 0, 0)), mode=Mode.PRIVATE) as mirror5_copy_3_sk1:
        with BuildLine():
            Line((-0.5, 18.5), (-0.5, 21.32455532))
            ThreePointArc((-0.5, 21.32455532), (2.5, 22), (5.5, 21.32455532))
            Line((5.5, 21.32455532), (5.5, 18.5))
            Line((5.5, 18.5), (-0.5, 18.5))
        make_face()
    mirror5_copy_3_tool1 = extrude(mirror5_copy_3_sk1.sketch, amount=-MIRROR5_COPY_3_REACH, mode=Mode.PRIVATE) & part.part
    add(mirror5_copy_3_tool1.solids().sort_by_distance((8.6, 9.854217, 2.5))[0], mode=Mode.SUBTRACT)

    # Sketch33 → Loft4 section 0
    with BuildSketch(Plane.XY.offset(5.5)):
        with BuildLine():
            Line((-8.6, 30), (8.6, 30))
            Line((8.6, 30), (8.6, 27))
            Line((8.6, 27), (-8.6, 27))
            Line((-8.6, 27), (-8.6, 30))
        make_face()
    # Sketch34 → Loft4 section 1
    with BuildSketch(Plane(origin=(0, 0, 17.5), x_dir=(-1, 0, 0), z_dir=(0, 0, -1))):
        with BuildLine():
            Line((-8.6, 30), (8.6, 30))
            Line((8.6, 30), (8.6, 27))
            Line((8.6, 27), (-8.6, 27))
            Line((-8.6, 27), (-8.6, 30))
        make_face()
    loft4 = loft()

    # Mirror6: Loft4 across plane
    add(loft4.mirror(Plane(origin=(0, 15, 0), x_dir=(0, 0, 1), z_dir=(0, -1, 0))))

    # Sketch36 → Cut-Extrude19 (cut)
    with BuildSketch(Plane(origin=(0, 30, 0), x_dir=(1, 0, 0), z_dir=(0, 1, 0))):
        with Locations((2.558914309, 20.716820694)):
            Rectangle(SKETCH36_W, SKETCH36_H)
    extrude(amount=-CUT_EXTRUDE19_DEPTH, mode=Mode.SUBTRACT)

    # Sketch37 → Cut-Extrude20 (cut)
    with BuildSketch(Plane(origin=(0, 18, 0), x_dir=(1, 0, 0), z_dir=(0, 1, 0))):
        Polygon((35, 30.636970377), (-54.070998832, 30.636970377), (-54.070998832, -45.113589703), (35, -45.113589703), (52.4824214, -45.113589703), (52.4824214, 30.636970377), align=None)
        with Locations((0, -2.5)):
            Rectangle(SKETCH37_W, SKETCH37_H, mode=Mode.SUBTRACT)
    extrude(amount=-CUT_EXTRUDE20_DEPTH, mode=Mode.SUBTRACT)

    # Sketch38 → Cut-Extrude21 (cut)
    with BuildSketch(Plane(origin=(0, 15.5, 0), x_dir=(1, 0, 0), z_dir=(0, 1, 0))):
        with Locations((0.398006196, -35.5)):
            Rectangle(SKETCH38_W, SKETCH38_H)
    extrude(amount=-CUT_EXTRUDE21_DEPTH, mode=Mode.SUBTRACT)

    # Sketch39 → Boss-Extrude11 (add)
    with BuildSketch(Plane(origin=(0, 18, 0), x_dir=(1, 0, 0), z_dir=(0, 1, 0))):
        with Locations((0, -2.5)):
            Rectangle(SKETCH39_W, SKETCH39_H)
    extrude(amount=BOSS_EXTRUDE11_DEPTH)


solid = part.part
